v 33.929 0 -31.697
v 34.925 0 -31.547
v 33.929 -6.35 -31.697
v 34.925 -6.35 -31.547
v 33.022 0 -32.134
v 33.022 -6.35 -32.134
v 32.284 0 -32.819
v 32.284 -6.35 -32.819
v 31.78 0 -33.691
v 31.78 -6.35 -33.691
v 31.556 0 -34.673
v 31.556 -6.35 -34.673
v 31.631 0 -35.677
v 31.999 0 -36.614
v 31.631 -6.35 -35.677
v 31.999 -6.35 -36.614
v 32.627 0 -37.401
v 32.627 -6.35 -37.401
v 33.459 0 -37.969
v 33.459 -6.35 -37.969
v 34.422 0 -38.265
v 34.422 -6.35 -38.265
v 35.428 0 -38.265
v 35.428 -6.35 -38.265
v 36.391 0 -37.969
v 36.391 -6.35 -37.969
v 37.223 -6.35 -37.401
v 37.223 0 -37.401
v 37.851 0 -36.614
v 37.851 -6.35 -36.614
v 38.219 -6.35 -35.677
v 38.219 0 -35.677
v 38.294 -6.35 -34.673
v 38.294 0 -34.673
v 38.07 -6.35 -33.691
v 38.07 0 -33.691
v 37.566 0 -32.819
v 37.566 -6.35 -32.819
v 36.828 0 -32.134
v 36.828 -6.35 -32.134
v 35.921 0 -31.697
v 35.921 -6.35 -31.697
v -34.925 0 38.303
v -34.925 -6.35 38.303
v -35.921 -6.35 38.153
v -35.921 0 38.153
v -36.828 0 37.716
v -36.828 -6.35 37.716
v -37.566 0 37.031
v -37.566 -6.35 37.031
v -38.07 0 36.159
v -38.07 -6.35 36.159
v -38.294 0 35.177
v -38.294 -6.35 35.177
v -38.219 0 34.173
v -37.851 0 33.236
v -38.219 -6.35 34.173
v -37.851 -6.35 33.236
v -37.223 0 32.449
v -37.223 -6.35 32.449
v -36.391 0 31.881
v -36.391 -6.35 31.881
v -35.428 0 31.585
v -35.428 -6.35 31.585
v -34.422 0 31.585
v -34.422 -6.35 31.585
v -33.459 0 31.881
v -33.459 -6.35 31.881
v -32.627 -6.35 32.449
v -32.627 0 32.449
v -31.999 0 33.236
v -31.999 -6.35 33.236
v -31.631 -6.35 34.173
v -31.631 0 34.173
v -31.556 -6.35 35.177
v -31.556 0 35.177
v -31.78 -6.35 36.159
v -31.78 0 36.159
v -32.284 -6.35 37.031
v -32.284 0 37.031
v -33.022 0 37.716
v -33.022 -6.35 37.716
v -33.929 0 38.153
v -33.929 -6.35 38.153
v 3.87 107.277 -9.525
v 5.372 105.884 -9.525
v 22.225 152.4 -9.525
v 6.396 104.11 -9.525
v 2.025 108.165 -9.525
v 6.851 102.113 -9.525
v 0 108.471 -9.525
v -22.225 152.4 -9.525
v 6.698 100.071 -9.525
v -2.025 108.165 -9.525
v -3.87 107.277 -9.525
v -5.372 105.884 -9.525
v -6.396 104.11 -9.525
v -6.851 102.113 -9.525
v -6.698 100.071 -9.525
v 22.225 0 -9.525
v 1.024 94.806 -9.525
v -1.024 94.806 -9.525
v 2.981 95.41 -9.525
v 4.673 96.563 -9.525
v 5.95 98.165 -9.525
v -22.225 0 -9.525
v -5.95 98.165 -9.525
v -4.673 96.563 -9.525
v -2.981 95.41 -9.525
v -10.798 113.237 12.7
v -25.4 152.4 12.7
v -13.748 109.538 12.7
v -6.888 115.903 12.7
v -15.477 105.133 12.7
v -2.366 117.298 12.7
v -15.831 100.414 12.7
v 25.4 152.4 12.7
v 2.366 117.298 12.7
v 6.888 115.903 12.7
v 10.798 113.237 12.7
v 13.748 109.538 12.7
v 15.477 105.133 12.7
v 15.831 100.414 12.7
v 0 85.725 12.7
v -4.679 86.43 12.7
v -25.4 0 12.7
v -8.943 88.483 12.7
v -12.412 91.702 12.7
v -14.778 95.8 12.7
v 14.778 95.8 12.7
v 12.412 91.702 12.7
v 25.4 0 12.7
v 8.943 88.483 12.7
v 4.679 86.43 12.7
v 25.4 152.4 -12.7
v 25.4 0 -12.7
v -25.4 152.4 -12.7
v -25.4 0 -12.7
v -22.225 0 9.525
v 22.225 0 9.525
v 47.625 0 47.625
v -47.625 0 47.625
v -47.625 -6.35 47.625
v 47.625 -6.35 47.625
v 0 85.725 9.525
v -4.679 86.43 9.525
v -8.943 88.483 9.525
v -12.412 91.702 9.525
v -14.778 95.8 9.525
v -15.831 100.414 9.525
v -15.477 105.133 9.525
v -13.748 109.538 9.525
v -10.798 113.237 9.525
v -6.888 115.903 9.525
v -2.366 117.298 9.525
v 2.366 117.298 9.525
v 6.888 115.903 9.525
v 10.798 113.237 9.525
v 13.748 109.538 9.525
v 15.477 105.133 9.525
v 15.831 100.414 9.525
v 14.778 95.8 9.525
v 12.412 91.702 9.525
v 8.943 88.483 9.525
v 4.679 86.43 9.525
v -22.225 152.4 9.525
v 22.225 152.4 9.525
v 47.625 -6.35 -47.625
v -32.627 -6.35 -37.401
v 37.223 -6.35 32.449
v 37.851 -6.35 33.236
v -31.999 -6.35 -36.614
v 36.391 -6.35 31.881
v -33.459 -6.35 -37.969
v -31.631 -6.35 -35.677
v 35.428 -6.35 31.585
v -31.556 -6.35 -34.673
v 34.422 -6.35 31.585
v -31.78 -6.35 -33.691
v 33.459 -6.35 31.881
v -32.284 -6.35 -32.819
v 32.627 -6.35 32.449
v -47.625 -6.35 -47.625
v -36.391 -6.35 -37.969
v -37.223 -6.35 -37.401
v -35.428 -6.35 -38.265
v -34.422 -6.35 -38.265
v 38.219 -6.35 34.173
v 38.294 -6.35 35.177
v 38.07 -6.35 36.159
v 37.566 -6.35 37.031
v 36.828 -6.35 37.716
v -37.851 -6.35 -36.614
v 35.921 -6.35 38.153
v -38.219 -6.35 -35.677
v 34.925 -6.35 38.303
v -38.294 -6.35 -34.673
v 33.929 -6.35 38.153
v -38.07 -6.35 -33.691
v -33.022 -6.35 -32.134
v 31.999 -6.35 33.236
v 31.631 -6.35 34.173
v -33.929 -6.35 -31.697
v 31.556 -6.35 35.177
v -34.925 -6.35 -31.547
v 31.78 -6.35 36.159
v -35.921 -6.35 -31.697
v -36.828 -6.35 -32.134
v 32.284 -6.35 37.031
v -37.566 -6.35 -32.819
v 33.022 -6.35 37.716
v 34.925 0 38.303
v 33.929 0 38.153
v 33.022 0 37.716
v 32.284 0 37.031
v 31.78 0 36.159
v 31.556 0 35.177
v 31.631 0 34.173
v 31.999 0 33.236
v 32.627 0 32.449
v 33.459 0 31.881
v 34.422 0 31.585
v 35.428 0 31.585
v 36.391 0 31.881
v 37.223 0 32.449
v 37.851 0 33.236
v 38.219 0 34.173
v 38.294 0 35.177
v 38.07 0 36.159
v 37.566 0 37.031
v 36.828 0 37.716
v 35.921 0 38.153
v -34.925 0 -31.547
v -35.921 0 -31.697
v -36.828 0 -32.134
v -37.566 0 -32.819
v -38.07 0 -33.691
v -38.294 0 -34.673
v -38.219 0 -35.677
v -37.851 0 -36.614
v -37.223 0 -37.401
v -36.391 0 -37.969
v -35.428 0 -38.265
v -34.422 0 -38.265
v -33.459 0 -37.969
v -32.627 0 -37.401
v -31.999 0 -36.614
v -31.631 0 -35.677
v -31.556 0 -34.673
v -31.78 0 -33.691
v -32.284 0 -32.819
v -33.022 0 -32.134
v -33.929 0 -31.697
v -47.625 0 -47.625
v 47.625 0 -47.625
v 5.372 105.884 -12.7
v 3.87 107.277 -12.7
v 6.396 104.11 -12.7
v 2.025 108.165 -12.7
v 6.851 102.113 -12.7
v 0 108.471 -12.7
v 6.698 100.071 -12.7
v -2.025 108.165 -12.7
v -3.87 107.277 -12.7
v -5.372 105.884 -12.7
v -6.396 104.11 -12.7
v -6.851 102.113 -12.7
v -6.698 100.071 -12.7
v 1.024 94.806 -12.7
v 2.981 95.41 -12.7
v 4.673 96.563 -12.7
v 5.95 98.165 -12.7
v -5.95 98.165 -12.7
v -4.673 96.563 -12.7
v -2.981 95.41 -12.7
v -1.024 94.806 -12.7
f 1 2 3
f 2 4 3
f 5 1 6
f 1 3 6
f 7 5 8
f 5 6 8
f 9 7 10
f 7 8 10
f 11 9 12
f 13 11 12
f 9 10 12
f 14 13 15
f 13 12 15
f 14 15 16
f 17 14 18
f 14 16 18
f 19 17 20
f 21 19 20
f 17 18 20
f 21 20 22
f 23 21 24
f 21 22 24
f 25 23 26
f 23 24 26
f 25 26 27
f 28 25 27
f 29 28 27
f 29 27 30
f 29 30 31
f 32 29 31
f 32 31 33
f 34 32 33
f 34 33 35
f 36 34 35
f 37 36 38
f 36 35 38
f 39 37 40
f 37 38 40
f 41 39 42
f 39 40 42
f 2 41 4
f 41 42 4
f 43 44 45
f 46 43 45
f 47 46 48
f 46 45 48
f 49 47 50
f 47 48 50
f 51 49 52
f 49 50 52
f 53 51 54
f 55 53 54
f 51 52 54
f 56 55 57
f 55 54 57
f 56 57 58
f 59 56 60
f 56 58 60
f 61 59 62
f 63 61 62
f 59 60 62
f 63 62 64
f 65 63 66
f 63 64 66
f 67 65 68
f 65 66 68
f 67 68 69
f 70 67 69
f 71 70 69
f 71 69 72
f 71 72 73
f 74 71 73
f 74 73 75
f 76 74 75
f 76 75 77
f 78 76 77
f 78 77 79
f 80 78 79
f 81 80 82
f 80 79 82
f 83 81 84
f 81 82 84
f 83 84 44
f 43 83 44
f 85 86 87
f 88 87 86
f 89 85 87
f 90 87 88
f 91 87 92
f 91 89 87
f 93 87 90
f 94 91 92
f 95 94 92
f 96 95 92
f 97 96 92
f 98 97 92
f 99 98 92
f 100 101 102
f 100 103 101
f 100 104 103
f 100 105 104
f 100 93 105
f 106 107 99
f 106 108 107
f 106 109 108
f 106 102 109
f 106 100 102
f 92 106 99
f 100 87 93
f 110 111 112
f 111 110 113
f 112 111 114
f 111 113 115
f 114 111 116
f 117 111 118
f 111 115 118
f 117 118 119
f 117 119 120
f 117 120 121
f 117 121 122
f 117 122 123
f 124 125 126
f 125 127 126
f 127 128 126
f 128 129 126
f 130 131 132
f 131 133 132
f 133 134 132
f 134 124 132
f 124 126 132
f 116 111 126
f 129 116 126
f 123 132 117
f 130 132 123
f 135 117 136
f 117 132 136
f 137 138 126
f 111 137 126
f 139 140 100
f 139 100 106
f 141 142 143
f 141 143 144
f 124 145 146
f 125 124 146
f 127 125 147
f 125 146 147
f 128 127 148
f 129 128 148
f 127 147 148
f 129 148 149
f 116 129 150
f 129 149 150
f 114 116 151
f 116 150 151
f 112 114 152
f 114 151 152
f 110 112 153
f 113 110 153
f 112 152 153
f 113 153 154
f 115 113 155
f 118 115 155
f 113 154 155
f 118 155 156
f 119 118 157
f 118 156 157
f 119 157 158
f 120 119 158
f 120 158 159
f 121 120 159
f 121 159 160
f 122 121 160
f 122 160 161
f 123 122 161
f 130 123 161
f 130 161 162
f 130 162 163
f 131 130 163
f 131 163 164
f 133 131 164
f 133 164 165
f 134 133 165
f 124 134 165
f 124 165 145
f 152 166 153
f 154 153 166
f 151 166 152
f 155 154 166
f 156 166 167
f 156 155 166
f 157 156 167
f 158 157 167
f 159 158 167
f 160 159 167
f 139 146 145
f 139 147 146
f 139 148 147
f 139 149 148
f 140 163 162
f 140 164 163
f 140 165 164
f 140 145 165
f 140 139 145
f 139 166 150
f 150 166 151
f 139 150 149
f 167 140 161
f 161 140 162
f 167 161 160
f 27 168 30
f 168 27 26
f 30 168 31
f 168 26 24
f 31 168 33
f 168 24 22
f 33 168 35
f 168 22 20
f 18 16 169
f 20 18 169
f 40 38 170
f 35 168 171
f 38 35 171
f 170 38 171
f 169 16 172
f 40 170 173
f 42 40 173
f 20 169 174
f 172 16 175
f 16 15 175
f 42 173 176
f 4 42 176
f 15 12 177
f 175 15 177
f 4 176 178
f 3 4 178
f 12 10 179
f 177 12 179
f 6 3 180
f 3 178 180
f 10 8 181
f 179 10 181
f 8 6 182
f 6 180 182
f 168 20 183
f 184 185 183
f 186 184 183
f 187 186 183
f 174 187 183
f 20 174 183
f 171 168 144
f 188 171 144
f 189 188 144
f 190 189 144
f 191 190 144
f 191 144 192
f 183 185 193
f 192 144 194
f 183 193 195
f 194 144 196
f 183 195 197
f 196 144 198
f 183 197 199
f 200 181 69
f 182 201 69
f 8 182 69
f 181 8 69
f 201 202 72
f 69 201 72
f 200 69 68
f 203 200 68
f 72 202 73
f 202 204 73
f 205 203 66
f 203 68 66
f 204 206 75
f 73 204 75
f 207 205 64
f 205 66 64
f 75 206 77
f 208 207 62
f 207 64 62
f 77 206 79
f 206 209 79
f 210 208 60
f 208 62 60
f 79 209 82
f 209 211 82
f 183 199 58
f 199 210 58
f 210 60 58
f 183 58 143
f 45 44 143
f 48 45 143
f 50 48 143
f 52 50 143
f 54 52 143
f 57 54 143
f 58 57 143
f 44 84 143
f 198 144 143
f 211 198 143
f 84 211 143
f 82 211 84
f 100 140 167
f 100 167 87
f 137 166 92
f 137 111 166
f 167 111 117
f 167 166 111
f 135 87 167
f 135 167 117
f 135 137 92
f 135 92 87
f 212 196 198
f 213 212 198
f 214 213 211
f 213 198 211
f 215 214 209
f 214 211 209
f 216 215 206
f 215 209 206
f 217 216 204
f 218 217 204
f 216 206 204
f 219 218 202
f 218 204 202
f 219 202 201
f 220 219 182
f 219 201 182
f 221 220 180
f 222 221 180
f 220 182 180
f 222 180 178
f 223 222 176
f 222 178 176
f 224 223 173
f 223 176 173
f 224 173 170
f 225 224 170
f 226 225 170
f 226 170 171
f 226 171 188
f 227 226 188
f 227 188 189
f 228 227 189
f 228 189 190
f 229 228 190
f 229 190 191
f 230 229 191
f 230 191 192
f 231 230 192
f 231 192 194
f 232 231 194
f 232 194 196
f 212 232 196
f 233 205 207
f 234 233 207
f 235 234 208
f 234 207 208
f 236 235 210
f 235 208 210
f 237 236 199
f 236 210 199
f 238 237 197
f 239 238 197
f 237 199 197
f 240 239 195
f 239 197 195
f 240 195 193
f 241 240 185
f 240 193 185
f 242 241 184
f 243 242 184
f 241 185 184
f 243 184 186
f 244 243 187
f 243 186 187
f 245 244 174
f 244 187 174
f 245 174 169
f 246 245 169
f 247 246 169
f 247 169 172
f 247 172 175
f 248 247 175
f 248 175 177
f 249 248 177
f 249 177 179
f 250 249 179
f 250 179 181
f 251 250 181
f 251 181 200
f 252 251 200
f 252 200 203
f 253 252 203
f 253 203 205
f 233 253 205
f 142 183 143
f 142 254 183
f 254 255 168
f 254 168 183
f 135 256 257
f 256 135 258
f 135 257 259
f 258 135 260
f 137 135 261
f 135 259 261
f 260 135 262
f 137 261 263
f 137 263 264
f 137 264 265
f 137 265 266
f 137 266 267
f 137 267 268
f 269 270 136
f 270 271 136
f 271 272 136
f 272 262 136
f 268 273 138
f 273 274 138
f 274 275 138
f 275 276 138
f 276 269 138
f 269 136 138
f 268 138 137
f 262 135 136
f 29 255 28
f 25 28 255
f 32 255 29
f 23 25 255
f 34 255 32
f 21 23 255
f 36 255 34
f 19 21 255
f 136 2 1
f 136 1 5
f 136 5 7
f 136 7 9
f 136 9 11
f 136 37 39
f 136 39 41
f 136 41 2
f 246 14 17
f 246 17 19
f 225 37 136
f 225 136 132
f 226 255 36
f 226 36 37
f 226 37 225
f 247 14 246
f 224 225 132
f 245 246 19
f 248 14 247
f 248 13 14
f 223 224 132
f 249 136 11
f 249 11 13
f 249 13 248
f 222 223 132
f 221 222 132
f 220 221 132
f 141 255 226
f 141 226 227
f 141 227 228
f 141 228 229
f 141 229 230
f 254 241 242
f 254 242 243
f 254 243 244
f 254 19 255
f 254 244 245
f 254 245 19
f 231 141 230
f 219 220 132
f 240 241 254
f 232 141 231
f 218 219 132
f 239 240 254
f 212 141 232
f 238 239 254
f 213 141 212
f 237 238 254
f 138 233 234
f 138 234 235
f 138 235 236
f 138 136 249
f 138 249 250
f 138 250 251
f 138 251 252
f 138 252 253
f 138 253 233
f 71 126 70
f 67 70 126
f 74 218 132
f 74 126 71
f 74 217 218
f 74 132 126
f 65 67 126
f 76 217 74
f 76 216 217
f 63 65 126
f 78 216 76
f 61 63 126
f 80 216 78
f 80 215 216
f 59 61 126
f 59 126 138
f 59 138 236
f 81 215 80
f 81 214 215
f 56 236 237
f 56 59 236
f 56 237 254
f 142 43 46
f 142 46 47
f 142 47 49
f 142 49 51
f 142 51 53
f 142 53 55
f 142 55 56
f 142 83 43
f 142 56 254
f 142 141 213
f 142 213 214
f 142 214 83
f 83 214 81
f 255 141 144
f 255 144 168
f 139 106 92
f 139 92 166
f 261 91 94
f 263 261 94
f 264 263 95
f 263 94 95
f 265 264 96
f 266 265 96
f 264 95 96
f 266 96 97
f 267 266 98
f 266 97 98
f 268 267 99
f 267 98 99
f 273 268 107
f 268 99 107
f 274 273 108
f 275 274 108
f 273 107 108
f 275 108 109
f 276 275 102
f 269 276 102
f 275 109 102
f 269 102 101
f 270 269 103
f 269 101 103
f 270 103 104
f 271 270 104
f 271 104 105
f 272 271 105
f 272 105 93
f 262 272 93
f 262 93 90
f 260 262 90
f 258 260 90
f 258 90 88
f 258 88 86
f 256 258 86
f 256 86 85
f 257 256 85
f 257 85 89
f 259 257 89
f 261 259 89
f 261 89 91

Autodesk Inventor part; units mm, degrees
ref_plane "YZ Plane" through (0, 0, 0) normal (1, 0, 0) x (0, 1, 0)
ref_plane "XZ Plane" through (0, 0, 0) normal (0, 1, 0) x (-1, 0, 0)
ref_plane "XY Plane" through (0, 0, 0) normal (0, 0, 1) x (1, 0, 0)
sketch "Sketch1" plane through (0, 0, 0) normal (0, 1, 0) x (-1, 0, 0)
  line L0 (47.625, 47.625) -> (-47.625, 47.625)
  line L1 (-47.625, 47.625) -> (-47.625, -47.625)
  line L2 (-47.625, -47.625) -> (47.625, -47.625)
  line L3 (47.625, -47.625) -> (47.625, 47.625)
  line L4 (47.625, 47.625) -> (-47.625, -47.625) construction
  line L5 (-47.625, 47.625) -> (47.625, -47.625) construction
  point P0 (0, 0)
  dimension "d0" = 95.25
extrude "Extrusion1" add sketch "Sketch1" against normal blind 6.35
sketch "Sketch2" plane through (0, 0, 0) normal (0, 1, 0) x (1, 0, 0)
  line L0 (-25.4, -12.7) -> (25.4, -12.7)
  line L1 (25.4, -12.7) -> (25.4, 12.7)
  line L2 (25.4, 12.7) -> (-25.4, 12.7)
  line L3 (-25.4, 12.7) -> (-25.4, -12.7)
  line L4 (-25.4, -12.7) -> (25.4, 12.7) construction
  line L5 (25.4, -12.7) -> (-25.4, 12.7) construction
  line L6 (-22.225, -9.525) -> (22.225, -9.525)
  line L7 (22.225, -9.525) -> (22.225, 9.525)
  line L8 (22.225, 9.525) -> (-22.225, 9.525)
  line L9 (-22.225, 9.525) -> (-22.225, -9.525)
  line L10 (-22.225, -9.525) -> (22.225, 9.525) construction
  line L11 (22.225, -9.525) -> (-22.225, 9.525) construction
  point P0 (0, 0)
  dimension "d3" = 50.8
  dimension "d4" = 25.4
  dimension "d5" = 3.175
  dimension "d6" = 3.175
extrude "Extrusion2" add sketch "Sketch2" along normal blind 152.4
sketch "Sketch3" plane through (-25.4, 0, 12.7) normal (0, 0, 1) x (1, 0, 0)
  line L0 (25.4, 0) -> (25.4, 152.4) construction
  line L1 (0, 152.4) -> (50.8, 152.4) construction
  line L2 (-22.225, 0) -> (73.025, 0) construction
  point P0 (25.4, 101.6)
  dimension "d9" = 101.6
hole "Hole1" at (0, 101.6, 12.7) direction (0, 0, -1) diameter 31.75 end up to surface
sketch "Sketch4" plane through (25.4, 0, -12.7) normal (0, 0, -1) x (-1, 0, 0)
  line L0 (25.4, 0) -> (25.4, 152.4) construction
  line L1 (50.8, 152.4) -> (0, 152.4) construction
  circle A0 centre (25.4, 101.6) radius 15.875 projected
hole "Hole2" at (0, 101.6, -12.7) direction (0, 0, 1) diameter 13.7414 end up to surface
sketch "Sketch5" plane through (0, 0, 0) normal (0, 1, 0) x (1, 0, 0)
  line L0 (-34.925, -34.925) -> (34.925, -34.925) construction
  line L1 (34.925, -34.925) -> (34.925, 34.925) construction
  line L2 (34.925, 34.925) -> (-34.925, 34.925) construction
  line L3 (-34.925, 34.925) -> (-34.925, -34.925) construction
  line L4 (-34.925, -34.925) -> (34.925, 34.925) construction
  line L5 (34.925, -34.925) -> (-34.925, 34.925) construction
  line L6 (-47.625, 47.625) -> (-47.625, -47.625) projected
  line L7 (47.625, 47.625) -> (-47.625, 47.625) projected
  point P0 (0, 0)
  dimension "d25" = 12.7
  dimension "d26" = 12.7
hole "Hole3" at (-34.925, 0, -34.925) at (34.925, 0, -34.925) at (34.925, 0, 34.925) at (-34.925, 0, 34.925) direction (0, -1, 0) diameter 6.7564 end through all clearance for "Flat Head Machine Screw (82)" size "1/4" standard "Ansi Unified Screw Threads"
equation "\"d1\" = baseMaterialThickness"
equation "\"d5\" = postMaterialThickness"
equation "\"d6\" = postMaterialThickness"
equation "\"d10\" = flangeBearingHoleDiam"
equation "\"flangeBearingHoleDiam\" = 31.75"
equation "\"heightOfRod\" = 101.6"
equation "\"hightOfPost\" = 152.4"
equation "\"postMaterialThickness\" = 3.175"
equation "\"baseMaterialThickness\" = 6.35"
properties part number "ThunderhexPost"
